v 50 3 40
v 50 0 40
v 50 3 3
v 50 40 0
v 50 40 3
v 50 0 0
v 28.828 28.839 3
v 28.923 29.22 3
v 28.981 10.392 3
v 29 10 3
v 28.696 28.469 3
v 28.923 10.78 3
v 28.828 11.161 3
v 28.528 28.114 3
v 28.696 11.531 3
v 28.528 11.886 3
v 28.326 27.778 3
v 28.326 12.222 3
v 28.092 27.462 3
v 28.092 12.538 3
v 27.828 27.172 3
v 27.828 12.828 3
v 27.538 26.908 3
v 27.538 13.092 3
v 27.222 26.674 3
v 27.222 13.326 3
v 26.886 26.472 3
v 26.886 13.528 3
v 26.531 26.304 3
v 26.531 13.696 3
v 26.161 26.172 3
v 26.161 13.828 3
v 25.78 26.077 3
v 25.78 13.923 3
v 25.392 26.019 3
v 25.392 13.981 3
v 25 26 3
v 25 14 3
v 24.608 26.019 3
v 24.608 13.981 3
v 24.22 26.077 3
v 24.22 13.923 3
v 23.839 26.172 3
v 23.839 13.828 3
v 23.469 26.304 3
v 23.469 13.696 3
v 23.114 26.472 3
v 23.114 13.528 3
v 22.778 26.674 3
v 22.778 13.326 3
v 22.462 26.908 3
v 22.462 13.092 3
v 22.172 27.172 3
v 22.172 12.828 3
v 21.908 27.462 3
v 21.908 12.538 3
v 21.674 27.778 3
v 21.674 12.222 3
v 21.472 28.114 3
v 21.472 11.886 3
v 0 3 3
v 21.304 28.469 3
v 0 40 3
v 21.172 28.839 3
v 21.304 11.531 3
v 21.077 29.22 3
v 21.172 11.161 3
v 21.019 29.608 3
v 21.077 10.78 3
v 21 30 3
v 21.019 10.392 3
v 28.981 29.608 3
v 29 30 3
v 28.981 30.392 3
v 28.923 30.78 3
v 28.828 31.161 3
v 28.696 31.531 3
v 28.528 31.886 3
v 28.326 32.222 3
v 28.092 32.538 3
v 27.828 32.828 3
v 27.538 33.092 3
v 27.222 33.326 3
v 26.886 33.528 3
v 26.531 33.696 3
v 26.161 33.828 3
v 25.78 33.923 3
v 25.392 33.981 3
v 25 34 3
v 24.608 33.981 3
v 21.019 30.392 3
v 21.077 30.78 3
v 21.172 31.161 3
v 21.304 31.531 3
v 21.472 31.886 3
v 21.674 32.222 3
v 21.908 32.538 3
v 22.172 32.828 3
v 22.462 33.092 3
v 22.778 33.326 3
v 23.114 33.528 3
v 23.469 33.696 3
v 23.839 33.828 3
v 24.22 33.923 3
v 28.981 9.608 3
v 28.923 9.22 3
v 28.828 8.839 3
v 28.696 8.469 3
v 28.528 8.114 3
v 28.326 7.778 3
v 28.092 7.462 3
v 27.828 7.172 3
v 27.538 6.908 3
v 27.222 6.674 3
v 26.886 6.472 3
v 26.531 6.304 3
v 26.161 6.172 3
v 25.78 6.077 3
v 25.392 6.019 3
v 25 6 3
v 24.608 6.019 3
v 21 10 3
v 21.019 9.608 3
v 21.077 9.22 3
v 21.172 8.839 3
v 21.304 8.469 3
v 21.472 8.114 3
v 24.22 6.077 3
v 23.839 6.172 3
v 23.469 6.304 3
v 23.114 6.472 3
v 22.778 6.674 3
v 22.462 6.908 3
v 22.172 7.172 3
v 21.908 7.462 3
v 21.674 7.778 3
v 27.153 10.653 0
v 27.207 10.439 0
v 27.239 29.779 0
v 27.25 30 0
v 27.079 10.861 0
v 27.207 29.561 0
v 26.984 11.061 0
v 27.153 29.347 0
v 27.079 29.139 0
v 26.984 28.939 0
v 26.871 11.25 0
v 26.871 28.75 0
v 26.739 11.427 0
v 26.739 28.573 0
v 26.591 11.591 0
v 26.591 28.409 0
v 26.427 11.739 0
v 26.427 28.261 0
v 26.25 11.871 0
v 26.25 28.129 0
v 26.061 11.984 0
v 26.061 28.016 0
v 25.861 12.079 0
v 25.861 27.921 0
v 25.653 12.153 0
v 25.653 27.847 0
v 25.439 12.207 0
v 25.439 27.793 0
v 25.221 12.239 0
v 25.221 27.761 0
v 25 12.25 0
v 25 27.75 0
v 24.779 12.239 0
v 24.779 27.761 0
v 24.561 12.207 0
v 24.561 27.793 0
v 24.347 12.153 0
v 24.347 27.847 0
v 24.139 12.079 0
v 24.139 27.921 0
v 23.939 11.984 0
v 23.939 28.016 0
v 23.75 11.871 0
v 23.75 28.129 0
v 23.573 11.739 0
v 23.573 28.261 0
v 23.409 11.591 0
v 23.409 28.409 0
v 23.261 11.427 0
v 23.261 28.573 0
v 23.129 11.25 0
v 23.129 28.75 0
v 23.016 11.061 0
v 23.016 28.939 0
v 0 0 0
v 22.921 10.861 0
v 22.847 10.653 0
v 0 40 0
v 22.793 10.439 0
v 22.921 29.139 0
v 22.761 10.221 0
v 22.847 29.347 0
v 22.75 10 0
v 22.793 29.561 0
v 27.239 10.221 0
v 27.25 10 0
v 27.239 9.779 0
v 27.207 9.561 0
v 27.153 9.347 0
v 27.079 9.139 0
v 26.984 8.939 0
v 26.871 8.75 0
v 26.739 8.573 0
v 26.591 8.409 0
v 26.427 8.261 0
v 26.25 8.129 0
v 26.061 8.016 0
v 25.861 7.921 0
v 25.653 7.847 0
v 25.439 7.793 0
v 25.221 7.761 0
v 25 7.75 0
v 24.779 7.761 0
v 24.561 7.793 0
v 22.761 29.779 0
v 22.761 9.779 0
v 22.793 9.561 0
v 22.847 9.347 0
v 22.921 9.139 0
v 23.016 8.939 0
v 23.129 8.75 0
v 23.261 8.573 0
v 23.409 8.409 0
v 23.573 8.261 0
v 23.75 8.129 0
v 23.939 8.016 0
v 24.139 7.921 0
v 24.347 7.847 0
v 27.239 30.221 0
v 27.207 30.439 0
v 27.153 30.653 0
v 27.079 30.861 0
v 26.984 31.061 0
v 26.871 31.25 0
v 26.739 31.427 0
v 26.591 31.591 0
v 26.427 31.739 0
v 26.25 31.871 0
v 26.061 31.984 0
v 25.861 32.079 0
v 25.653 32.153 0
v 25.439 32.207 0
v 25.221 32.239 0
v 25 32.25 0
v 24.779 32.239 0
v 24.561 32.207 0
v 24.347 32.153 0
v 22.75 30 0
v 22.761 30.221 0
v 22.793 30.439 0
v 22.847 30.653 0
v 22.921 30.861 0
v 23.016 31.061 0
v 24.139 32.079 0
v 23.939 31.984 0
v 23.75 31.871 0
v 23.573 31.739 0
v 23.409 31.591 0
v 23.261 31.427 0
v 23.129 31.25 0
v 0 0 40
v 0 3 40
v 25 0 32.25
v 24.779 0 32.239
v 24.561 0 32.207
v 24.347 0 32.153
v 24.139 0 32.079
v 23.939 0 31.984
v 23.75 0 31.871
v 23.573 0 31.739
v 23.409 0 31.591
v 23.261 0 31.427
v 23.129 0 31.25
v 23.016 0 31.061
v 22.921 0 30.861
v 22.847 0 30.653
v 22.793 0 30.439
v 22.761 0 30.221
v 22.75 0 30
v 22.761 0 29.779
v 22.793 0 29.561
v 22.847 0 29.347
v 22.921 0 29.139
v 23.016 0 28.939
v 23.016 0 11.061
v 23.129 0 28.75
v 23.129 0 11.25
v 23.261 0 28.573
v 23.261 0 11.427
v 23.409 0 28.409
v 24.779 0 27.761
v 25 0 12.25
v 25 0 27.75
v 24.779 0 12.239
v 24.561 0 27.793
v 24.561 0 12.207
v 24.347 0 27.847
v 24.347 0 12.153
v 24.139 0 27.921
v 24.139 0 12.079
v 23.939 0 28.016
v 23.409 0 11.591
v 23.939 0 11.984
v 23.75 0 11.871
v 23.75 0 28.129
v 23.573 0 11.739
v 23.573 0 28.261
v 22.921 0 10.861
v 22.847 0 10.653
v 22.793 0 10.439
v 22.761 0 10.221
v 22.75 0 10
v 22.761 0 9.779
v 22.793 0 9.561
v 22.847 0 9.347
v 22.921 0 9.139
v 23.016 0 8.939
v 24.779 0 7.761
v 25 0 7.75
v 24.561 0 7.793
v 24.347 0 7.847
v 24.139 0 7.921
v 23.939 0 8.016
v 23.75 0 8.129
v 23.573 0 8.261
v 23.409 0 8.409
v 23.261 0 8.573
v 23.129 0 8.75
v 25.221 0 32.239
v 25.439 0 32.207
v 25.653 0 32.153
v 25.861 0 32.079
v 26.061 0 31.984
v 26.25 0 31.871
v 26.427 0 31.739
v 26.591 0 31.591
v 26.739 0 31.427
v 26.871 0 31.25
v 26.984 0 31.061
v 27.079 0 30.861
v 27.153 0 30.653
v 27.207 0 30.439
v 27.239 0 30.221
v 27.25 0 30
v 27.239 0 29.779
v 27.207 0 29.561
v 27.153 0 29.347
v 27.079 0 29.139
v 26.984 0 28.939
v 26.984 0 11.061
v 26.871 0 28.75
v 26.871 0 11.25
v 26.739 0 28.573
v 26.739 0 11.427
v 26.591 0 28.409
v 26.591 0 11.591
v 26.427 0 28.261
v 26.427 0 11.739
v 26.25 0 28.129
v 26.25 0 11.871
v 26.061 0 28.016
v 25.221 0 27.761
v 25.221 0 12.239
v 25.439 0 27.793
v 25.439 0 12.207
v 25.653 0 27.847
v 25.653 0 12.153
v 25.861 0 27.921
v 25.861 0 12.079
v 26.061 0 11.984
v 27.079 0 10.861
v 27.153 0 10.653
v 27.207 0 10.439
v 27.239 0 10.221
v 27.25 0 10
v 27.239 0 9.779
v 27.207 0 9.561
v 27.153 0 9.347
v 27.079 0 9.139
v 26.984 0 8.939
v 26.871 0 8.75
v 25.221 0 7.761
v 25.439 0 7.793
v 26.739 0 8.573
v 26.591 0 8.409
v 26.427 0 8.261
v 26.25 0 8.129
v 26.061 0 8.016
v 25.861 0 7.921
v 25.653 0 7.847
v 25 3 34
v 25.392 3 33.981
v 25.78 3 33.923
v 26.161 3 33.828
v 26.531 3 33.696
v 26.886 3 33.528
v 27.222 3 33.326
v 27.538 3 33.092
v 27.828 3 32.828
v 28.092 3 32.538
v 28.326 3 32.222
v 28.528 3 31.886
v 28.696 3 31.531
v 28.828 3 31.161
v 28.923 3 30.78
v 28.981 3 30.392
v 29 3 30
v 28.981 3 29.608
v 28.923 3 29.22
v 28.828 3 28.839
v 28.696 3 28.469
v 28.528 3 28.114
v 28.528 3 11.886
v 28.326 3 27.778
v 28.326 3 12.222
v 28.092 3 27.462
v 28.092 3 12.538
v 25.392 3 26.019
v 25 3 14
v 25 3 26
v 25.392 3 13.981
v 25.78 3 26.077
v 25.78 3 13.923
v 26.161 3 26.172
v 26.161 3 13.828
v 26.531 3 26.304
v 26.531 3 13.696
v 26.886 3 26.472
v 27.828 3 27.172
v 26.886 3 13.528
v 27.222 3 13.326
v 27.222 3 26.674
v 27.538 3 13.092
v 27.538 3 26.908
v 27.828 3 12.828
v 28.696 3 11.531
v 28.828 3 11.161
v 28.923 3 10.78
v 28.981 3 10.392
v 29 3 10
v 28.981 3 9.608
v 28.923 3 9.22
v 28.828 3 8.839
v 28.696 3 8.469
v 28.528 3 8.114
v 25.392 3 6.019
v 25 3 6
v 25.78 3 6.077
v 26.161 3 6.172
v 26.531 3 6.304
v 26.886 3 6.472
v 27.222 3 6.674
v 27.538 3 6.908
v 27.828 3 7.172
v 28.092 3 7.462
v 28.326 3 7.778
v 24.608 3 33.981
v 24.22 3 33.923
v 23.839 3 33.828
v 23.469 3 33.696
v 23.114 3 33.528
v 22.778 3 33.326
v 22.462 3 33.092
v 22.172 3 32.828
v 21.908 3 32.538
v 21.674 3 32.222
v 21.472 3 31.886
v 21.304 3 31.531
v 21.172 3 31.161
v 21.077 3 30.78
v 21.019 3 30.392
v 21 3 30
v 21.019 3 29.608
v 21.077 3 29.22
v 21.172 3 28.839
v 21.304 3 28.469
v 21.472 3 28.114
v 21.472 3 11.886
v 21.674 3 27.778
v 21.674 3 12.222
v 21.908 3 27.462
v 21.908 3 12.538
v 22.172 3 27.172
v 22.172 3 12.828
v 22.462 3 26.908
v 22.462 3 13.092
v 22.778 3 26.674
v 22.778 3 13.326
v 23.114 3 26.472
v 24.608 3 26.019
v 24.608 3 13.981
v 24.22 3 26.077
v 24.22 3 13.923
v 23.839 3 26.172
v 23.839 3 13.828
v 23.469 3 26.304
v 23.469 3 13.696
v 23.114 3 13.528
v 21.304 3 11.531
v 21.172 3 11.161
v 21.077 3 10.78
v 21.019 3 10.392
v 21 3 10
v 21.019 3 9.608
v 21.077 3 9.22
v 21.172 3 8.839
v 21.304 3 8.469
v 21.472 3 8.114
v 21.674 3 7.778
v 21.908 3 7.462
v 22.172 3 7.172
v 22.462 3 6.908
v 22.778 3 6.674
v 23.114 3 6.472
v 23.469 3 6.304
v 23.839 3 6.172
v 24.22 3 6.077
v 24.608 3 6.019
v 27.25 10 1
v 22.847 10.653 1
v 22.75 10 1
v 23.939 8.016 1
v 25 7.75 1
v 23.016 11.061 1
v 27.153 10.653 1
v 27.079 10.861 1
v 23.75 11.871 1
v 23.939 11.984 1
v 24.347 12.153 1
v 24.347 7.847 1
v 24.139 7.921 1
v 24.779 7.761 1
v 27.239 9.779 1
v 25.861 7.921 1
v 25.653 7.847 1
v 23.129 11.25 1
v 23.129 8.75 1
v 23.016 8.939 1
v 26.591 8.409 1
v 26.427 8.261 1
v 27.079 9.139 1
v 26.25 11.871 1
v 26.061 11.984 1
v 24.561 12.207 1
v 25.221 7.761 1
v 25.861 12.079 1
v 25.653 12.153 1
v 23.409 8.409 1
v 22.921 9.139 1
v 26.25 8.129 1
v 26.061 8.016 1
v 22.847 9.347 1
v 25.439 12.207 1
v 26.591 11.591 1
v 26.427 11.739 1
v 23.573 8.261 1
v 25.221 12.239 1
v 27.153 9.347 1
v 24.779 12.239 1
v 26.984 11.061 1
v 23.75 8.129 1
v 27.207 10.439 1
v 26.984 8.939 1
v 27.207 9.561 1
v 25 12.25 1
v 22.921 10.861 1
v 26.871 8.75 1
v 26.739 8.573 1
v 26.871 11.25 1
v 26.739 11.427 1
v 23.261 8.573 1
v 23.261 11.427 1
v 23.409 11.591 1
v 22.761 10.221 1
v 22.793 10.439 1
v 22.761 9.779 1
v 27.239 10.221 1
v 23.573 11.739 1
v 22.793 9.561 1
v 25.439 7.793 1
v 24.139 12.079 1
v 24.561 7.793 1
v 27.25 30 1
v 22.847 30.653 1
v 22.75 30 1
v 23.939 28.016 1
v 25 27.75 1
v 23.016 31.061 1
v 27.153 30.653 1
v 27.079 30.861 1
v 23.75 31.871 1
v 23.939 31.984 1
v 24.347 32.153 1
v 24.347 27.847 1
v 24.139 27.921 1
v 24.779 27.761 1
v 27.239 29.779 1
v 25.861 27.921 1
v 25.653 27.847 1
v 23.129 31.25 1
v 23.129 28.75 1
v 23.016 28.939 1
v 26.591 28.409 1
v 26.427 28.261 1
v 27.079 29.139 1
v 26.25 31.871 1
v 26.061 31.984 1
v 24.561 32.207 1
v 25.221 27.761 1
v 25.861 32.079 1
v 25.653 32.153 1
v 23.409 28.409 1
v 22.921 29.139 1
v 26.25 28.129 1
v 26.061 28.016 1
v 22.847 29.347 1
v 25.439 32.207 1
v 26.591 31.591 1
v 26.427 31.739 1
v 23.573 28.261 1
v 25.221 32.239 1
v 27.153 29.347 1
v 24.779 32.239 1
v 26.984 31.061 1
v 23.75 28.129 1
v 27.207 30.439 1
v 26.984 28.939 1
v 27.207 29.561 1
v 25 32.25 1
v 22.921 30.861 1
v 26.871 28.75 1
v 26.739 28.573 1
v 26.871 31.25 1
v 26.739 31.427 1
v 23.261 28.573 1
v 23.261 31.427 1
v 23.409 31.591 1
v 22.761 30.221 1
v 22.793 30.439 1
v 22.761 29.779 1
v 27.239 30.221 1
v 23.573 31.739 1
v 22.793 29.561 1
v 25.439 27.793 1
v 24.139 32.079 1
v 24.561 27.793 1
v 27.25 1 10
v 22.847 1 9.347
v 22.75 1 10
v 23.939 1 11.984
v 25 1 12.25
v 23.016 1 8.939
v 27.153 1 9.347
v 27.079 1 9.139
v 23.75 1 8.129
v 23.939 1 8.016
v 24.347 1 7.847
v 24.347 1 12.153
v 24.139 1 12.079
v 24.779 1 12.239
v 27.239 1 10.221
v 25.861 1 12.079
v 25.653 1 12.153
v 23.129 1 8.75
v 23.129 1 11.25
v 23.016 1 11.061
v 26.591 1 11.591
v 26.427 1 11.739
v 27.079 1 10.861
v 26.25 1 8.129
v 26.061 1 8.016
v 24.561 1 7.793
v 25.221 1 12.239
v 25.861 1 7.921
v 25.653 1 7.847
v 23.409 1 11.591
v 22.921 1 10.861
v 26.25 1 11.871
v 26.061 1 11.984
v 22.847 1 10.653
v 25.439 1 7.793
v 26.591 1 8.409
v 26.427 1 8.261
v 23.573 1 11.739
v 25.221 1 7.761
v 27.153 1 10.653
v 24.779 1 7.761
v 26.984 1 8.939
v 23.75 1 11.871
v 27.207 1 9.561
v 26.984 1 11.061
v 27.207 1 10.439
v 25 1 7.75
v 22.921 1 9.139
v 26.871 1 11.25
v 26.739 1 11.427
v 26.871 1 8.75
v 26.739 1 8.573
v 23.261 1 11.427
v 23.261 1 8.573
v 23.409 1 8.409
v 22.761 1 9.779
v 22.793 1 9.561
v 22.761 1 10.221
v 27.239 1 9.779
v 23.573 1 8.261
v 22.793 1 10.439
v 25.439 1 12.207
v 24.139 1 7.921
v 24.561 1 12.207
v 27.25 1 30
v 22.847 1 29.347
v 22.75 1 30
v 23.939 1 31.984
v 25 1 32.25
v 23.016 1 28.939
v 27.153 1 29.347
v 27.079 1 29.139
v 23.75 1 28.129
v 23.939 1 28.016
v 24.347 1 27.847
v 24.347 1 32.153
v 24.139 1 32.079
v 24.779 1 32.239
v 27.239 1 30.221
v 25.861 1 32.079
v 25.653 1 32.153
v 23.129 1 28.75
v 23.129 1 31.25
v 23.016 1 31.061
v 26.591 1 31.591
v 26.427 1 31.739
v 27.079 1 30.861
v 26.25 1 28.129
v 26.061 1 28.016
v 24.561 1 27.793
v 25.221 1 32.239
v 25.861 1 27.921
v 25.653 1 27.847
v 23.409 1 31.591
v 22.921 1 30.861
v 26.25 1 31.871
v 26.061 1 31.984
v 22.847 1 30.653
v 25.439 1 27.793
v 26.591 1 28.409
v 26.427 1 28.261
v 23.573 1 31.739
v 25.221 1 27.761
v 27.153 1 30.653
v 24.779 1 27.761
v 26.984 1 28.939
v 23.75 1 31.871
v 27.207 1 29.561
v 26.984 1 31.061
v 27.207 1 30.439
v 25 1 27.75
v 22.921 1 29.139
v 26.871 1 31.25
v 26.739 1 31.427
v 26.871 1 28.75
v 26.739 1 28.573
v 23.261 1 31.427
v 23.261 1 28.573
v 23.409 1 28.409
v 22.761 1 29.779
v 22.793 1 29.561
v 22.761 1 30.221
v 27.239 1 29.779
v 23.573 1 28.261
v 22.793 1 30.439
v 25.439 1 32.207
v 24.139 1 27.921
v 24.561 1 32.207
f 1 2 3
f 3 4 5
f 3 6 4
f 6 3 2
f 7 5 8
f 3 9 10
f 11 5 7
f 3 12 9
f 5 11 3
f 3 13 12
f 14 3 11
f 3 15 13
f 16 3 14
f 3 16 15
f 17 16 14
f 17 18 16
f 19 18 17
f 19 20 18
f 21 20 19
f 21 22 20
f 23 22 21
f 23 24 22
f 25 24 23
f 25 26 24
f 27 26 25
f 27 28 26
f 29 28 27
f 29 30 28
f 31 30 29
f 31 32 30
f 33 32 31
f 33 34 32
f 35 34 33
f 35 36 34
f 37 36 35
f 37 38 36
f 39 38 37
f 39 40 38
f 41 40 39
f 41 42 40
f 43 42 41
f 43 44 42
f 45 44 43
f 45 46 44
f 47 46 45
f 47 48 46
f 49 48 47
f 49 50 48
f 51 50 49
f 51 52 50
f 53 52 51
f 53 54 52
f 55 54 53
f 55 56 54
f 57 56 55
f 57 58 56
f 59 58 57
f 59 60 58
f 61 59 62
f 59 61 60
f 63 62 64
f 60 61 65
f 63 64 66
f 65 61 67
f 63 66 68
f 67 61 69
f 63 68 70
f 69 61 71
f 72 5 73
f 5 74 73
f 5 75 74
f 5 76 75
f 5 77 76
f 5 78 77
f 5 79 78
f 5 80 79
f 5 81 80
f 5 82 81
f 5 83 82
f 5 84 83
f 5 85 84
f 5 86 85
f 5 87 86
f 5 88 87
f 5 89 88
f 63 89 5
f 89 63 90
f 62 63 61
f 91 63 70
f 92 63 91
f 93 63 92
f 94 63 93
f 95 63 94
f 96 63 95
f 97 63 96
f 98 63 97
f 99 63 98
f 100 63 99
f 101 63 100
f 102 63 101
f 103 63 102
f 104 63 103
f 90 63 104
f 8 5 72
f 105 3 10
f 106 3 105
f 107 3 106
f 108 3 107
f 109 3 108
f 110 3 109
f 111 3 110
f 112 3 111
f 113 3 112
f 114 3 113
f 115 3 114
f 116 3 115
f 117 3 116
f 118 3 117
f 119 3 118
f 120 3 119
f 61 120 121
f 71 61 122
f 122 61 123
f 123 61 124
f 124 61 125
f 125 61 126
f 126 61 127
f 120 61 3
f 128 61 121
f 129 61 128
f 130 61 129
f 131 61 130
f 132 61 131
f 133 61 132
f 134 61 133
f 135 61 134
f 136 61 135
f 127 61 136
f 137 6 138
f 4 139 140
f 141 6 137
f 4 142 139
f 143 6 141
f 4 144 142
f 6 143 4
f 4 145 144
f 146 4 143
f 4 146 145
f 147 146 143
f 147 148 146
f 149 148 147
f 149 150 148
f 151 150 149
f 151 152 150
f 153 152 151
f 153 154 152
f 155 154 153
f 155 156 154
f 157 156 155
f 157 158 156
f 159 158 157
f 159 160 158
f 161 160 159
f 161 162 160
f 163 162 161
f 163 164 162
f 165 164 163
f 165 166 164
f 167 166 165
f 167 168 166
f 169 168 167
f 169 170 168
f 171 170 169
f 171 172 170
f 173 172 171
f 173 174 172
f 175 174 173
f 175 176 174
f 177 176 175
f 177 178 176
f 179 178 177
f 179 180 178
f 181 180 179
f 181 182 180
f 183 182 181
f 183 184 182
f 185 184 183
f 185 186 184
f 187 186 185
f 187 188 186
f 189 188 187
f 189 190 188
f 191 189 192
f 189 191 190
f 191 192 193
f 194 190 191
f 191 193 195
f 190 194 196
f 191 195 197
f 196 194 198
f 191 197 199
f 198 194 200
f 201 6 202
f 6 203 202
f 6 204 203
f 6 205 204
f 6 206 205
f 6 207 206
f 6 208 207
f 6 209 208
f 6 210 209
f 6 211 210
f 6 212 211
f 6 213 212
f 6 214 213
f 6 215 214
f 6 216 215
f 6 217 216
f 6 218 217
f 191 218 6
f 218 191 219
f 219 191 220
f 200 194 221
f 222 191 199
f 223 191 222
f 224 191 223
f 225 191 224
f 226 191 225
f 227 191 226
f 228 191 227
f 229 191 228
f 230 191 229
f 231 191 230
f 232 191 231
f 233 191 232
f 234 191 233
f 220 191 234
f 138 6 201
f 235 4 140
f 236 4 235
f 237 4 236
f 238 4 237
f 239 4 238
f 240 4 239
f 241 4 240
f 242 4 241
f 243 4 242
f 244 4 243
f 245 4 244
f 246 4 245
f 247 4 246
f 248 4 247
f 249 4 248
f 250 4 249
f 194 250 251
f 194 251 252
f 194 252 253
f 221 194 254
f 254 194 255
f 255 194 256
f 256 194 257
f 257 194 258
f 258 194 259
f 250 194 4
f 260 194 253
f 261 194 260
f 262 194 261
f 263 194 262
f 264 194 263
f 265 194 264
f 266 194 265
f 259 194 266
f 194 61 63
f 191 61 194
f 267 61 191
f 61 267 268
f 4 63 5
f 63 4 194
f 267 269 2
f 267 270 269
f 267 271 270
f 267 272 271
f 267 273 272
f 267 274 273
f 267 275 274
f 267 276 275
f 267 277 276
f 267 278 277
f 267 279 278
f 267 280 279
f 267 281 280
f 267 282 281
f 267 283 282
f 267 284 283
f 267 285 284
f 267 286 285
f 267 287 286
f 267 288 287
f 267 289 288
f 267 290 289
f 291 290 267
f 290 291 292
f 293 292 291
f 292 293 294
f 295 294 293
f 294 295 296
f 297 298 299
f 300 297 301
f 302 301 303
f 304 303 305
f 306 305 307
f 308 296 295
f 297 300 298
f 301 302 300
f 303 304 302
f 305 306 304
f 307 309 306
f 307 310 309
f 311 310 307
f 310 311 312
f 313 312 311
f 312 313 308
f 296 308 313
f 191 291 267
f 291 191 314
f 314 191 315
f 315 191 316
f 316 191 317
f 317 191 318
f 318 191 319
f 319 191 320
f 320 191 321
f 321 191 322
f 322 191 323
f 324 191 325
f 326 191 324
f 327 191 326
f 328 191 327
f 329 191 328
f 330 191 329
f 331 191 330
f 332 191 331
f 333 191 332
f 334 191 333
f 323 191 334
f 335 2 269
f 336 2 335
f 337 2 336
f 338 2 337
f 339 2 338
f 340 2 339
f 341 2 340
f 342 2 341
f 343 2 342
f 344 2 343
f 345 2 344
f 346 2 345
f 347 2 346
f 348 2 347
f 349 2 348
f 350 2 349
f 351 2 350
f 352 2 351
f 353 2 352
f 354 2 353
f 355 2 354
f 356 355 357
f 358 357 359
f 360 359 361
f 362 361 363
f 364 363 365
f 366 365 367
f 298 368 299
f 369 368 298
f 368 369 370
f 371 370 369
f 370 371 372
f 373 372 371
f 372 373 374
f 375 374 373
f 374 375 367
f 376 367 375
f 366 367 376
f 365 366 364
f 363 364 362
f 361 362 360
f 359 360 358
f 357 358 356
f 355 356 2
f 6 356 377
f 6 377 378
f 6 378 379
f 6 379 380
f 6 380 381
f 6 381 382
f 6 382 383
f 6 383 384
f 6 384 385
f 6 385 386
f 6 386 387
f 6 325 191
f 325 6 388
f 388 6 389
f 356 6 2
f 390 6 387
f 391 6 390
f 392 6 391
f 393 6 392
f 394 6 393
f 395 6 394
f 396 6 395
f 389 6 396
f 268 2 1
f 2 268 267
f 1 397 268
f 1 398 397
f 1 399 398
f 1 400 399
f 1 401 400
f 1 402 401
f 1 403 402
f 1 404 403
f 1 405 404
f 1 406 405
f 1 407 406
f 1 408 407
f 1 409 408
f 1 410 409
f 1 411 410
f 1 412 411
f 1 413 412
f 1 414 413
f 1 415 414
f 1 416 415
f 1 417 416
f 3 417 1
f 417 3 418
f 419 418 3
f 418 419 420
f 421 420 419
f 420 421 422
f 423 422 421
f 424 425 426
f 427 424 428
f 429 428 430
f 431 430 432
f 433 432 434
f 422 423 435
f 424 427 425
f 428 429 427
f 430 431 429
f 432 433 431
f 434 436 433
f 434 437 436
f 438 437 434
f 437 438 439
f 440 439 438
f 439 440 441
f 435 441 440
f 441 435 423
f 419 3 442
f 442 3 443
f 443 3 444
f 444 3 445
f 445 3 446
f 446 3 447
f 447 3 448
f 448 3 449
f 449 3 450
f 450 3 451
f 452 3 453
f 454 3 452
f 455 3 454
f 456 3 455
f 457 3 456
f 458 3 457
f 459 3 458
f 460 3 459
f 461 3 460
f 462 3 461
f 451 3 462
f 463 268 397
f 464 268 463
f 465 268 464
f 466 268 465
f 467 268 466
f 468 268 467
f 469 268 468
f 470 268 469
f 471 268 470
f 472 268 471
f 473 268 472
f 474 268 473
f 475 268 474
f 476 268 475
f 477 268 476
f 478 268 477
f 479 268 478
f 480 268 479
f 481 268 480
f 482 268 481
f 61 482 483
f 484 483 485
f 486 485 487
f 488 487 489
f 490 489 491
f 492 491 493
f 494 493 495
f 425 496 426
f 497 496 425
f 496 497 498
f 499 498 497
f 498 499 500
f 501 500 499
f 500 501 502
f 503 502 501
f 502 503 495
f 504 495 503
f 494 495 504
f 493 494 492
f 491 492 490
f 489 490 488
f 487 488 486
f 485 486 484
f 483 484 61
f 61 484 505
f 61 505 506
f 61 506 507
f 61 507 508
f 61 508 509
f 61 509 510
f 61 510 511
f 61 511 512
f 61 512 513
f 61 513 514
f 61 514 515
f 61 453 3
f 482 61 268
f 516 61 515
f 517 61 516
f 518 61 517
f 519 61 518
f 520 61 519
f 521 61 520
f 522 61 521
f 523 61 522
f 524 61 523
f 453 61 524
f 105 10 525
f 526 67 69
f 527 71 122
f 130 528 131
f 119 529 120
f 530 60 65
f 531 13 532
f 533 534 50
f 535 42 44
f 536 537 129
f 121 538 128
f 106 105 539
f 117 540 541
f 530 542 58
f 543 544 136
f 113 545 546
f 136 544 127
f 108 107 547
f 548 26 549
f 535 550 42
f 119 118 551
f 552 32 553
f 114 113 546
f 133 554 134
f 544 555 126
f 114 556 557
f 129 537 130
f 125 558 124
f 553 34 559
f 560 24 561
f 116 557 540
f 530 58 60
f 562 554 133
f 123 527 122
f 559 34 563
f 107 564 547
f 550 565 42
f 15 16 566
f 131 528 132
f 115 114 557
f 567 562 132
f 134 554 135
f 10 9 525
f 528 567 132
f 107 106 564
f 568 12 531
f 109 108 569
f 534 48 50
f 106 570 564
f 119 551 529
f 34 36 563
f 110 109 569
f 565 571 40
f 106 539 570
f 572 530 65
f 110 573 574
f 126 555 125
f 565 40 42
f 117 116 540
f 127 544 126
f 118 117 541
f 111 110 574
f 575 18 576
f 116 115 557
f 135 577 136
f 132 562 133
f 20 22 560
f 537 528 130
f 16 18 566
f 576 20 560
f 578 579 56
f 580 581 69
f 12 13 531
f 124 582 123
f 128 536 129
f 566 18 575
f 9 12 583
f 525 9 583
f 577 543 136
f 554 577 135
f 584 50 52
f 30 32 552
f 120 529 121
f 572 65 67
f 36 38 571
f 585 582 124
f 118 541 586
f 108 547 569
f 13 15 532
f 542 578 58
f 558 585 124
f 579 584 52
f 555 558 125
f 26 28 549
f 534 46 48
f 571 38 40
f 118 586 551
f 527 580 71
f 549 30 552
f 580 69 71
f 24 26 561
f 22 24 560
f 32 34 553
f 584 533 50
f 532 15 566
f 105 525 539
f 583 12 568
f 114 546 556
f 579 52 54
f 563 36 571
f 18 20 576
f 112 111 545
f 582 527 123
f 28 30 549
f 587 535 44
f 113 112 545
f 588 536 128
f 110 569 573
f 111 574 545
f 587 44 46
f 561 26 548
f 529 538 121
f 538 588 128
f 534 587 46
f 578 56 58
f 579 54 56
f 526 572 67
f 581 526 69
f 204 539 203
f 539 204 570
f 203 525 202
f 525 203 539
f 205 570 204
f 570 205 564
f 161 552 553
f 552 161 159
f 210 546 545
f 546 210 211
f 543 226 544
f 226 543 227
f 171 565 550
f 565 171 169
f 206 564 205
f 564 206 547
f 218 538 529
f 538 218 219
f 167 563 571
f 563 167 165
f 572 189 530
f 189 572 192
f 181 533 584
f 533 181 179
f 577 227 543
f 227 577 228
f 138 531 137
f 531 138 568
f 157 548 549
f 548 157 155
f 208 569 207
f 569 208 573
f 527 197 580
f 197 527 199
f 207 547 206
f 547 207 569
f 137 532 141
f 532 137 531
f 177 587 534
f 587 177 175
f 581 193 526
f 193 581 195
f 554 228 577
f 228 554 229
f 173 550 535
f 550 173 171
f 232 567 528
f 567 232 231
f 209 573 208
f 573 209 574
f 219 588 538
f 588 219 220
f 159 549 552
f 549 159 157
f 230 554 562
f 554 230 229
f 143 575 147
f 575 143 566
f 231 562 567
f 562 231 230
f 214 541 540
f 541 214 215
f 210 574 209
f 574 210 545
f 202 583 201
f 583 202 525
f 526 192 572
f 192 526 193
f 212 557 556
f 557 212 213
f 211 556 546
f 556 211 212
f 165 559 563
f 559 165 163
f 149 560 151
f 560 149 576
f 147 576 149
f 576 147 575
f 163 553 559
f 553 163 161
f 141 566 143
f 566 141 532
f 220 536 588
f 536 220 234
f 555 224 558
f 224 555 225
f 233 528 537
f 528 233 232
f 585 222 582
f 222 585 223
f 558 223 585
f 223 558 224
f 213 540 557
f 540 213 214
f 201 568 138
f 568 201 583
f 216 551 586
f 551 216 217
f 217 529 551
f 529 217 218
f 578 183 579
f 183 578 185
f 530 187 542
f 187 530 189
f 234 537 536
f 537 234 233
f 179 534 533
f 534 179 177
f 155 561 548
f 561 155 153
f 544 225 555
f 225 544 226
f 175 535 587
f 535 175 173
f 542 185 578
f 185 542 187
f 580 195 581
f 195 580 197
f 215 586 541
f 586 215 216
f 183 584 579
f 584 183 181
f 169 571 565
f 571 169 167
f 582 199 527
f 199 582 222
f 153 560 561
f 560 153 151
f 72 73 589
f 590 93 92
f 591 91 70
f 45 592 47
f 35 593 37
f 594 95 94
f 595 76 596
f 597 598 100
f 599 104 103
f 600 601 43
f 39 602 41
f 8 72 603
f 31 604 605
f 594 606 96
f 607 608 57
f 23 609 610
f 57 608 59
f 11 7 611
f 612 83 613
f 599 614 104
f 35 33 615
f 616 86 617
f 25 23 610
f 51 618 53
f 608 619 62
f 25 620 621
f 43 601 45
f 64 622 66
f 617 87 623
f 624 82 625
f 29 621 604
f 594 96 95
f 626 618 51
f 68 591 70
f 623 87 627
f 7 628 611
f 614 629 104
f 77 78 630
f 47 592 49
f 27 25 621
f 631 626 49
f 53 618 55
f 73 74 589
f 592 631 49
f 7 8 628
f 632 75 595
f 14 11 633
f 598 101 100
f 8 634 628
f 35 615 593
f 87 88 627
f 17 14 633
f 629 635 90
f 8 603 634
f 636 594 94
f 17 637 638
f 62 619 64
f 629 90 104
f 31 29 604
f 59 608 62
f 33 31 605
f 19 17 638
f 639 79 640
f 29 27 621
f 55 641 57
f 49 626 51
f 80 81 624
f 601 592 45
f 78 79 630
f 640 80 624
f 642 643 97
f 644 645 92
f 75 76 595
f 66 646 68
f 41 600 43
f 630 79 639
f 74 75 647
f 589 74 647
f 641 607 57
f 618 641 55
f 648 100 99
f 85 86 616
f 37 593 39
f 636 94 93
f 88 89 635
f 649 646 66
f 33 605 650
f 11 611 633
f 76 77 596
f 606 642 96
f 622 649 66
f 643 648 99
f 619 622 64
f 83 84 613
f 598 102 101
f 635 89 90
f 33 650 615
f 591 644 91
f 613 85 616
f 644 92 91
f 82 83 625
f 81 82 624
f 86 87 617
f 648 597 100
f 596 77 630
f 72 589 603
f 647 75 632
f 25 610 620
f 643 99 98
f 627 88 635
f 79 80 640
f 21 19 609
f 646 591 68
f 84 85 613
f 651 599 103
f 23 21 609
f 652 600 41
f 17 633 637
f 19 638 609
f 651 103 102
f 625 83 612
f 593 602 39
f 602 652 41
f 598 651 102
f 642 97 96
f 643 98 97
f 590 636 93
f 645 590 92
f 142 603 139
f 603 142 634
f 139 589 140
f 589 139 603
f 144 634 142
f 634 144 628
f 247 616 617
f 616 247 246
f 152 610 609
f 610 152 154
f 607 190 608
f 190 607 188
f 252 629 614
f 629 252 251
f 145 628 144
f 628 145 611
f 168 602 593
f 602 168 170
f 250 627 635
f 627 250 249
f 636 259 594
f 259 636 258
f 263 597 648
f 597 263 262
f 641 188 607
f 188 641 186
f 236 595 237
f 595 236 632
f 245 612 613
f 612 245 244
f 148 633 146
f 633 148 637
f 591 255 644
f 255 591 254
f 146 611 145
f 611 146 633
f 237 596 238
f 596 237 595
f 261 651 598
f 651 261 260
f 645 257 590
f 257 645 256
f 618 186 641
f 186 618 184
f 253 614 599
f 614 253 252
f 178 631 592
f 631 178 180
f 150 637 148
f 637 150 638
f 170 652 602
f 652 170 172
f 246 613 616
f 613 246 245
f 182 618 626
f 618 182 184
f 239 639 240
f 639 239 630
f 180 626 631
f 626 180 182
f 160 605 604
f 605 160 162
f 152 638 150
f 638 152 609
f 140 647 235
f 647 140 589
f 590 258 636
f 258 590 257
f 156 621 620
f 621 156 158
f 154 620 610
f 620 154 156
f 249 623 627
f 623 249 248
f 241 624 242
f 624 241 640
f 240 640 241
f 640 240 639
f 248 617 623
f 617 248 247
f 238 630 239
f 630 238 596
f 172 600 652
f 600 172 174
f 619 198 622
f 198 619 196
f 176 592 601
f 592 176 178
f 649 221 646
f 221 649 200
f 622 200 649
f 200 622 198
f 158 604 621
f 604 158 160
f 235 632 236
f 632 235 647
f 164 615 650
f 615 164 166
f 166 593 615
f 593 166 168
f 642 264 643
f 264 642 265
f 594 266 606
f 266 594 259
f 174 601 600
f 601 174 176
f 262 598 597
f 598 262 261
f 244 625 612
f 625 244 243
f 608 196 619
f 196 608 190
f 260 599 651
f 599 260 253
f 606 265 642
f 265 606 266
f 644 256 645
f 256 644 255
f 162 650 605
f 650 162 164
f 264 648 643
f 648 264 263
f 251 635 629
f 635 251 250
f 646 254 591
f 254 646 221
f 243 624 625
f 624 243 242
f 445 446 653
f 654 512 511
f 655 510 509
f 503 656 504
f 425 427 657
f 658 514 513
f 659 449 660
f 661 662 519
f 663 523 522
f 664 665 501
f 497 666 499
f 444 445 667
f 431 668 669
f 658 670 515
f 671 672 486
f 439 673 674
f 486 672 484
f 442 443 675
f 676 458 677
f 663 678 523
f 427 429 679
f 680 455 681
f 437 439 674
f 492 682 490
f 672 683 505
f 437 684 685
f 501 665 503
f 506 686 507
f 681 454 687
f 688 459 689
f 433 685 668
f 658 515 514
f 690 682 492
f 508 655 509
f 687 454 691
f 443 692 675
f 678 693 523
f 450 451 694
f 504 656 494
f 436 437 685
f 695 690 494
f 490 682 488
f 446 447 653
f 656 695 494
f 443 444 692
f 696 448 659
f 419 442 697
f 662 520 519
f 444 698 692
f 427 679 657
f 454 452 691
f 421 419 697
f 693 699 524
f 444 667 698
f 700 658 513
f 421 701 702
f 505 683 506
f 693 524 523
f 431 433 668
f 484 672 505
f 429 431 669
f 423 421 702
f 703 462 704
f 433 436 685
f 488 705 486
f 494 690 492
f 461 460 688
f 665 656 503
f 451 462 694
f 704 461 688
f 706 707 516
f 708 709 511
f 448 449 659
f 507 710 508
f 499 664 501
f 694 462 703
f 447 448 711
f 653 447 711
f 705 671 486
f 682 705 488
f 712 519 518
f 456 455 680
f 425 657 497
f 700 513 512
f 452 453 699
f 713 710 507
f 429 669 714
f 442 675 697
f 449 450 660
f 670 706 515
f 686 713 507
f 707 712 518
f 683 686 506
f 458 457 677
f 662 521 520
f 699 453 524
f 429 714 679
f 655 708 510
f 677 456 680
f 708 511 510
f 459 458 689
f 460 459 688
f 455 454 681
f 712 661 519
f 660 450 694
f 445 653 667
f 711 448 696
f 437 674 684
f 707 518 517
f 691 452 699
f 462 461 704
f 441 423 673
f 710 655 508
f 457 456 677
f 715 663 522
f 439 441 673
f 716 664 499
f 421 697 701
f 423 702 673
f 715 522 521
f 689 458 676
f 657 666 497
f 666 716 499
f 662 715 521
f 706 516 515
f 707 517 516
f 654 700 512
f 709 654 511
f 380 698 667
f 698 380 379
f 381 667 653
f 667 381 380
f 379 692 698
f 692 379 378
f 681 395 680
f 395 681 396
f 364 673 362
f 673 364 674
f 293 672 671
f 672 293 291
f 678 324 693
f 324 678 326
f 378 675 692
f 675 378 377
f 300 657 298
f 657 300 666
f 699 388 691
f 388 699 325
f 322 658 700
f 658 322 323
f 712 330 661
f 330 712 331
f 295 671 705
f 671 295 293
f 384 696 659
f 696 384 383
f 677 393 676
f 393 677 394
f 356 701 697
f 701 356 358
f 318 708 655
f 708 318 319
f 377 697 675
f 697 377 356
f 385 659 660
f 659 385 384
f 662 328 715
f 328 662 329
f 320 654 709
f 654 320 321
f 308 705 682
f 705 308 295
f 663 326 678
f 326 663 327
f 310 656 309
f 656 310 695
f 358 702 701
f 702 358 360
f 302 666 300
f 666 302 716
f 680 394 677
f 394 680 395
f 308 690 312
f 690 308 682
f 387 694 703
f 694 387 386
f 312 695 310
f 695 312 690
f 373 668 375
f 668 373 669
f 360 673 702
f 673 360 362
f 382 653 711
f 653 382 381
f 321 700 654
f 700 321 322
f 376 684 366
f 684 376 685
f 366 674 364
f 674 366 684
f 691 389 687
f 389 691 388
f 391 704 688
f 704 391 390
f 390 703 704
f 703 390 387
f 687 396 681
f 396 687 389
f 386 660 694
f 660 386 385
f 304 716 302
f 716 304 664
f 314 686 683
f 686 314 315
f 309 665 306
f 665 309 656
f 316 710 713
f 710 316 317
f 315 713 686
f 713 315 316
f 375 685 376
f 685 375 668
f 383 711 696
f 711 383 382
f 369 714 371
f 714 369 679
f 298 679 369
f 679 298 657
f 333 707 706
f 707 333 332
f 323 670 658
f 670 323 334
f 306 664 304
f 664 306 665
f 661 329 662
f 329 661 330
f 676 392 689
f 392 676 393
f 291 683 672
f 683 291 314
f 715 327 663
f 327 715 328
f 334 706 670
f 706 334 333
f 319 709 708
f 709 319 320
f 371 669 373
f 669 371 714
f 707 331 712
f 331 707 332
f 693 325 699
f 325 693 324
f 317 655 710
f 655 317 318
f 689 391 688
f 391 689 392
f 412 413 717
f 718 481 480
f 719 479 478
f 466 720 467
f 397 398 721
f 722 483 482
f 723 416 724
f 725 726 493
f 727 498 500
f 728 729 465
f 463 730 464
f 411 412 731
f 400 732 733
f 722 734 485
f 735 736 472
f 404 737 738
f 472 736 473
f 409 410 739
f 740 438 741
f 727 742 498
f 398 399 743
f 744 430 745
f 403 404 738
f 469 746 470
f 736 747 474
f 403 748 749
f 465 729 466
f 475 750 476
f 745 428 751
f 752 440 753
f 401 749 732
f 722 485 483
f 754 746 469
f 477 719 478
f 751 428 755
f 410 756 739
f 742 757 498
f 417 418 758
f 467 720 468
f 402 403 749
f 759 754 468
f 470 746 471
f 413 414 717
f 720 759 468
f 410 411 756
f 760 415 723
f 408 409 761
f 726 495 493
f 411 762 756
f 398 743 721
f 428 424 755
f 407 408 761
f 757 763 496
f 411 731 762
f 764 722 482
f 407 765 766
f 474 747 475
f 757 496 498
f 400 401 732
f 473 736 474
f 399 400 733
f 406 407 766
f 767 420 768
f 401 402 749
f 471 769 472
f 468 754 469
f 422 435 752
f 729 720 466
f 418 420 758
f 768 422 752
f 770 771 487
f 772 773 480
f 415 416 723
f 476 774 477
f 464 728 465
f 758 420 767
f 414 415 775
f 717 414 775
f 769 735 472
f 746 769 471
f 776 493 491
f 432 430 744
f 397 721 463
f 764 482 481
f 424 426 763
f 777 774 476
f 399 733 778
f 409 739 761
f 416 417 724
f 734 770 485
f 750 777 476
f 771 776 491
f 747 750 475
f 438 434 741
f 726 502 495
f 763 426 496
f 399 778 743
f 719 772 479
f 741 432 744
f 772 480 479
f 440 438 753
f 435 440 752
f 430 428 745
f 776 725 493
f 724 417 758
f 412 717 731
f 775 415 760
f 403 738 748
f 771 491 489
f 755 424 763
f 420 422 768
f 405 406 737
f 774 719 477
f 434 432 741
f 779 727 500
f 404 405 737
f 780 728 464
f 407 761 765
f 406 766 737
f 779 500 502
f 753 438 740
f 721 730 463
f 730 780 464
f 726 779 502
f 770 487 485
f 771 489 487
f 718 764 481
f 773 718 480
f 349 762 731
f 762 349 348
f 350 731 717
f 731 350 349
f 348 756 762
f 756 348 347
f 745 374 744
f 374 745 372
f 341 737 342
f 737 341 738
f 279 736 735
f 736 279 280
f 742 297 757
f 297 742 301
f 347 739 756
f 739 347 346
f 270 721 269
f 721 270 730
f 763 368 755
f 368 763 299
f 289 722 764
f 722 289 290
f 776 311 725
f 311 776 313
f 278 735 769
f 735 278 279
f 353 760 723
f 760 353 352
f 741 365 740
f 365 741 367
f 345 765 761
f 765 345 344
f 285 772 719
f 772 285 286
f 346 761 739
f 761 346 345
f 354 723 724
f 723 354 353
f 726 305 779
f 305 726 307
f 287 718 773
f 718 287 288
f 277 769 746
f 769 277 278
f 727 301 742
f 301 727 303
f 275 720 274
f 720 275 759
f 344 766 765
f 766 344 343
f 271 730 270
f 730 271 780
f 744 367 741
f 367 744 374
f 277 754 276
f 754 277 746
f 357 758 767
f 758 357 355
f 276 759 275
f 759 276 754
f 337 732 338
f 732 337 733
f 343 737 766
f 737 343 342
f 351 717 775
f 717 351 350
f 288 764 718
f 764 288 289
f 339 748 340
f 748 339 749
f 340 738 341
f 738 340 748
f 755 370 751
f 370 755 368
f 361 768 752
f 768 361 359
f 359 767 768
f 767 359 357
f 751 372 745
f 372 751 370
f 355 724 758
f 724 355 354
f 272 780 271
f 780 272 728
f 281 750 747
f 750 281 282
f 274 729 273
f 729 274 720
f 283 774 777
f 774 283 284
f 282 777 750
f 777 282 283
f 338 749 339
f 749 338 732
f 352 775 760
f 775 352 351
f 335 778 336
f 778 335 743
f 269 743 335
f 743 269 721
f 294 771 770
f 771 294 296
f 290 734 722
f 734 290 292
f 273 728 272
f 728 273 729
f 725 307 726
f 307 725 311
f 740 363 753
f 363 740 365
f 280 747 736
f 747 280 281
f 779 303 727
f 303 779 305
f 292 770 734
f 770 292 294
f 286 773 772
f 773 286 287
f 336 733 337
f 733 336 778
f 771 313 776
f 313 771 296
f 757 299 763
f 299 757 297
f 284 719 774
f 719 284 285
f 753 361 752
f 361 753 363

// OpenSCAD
// L-bracket parameters
flange_width = 50;
flange_depth_horiz = 40;
flange_height_vert = 40;
plate_thickness = 3;

// Countersunk hole parameters (M4 screw)
// M4 specifies a major diameter of 4mm.
// A common clearance hole diameter is 4.5mm.
// A common countersunk head diameter is 8mm, with a depth of 2mm.
cs_hole_depth_cs = 2; // Depth of the conical countersunk part
cs_hole_radius_top = 8 / 2; // Radius at the top of the countersunk part
cs_hole_radius_bottom = 4.5 / 2; // Radius at the bottom of the countersunk part (same as through hole)
thru_hole_radius = 4.5 / 2; // Radius of the straight through hole

// Overall depth for the hole operation to ensure complete cut through the plate
hole_overall_depth = plate_thickness + 2; // plate_thickness (3mm) + extra (2mm) = 5mm

// Hole placement parameters
hole_margin = 10; // Distance from the edge to the center of the hole

// Module for a countersunk hole, defined to originate at [0,0,0] and extend along the +Z axis.
// The wide part of the countersink is at Z=0, and it extends upwards towards +Z.
// This allows easy rotation and translation to position the holes correctly for subtraction.
module countersunk_hole_m4() {
    union() {
        // Conical countersunk part (from Z=0 to Z=cs_hole_depth_cs)
        cylinder(h = cs_hole_depth_cs, r1 = cs_hole_radius_top, r2 = cs_hole_radius_bottom, $fn = 64);
        // Straight through hole part, starting from where the countersunk part ends
        translate([0, 0, cs_hole_depth_cs])
        cylinder(h = hole_overall_depth - cs_hole_depth_cs, r = thru_hole_radius, $fn = 64);
    }
}

difference() {
    // 1. Main L-bracket shape
    union() {
        // Horizontal flange:
        // Dimensions: [width, depth, thickness] = [50mm, 40mm, 3mm]
        // Placed with inner corner at [0,0,0].
        // Extends from X=0 to 50, Y=0 to 40, Z=0 to 3.
        // +Y direction is depth, +Z direction is upwards (thickness).
        cube([flange_width, flange_depth_horiz, plate_thickness]);

        // Vertical flange:
        // Dimensions: [width, thickness, height] = [50mm, 3mm, 40mm]
        // Placed with inner corner at [0,0,0].
        // Extends from X=0 to 50, Y=0 to 3, Z=0 to 40.
        // +Y direction is thickness (into the bracket), +Z direction is height.
        cube([flange_width, plate_thickness, flange_height_vert]);
    }

    // 2. Countersunk holes to subtract from the bracket
    // The countersunk_hole_m4 module creates a hole with its wide part at Z=0, extending along +Z.
    // We need to translate and rotate it to match the desired position and orientation
    // such that the countersink faces "outwards" from the bracket.

    // Horizontal flange holes:
    // Located on the top surface (Z = plate_thickness), facing outwards (towards +Z).
    // The inner corner is at [0,0,0], so the "outer" side of the horizontal flange is its top surface (Z=plate_thickness).
    // X-coordinate: Center of the flange (flange_width / 2).
    // Y-coordinates: hole_margin and (flange_depth_horiz - hole_margin).
    // Z-coordinate: Top surface of the flange (plate_thickness).
    // Rotation: [180, 0, 0] makes the hole point downwards (-Z), ensuring the countersink is on the top surface
    //           and recesses into the material from there.
    translate([flange_width / 2, hole_margin, plate_thickness])
    rotate([180, 0, 0]) // Rotate 180 deg around X-axis to point hole downwards
    countersunk_hole_m4();

    translate([flange_width / 2, flange_depth_horiz - hole_margin, plate_thickness])
    rotate([180, 0, 0]) // Rotate 180 deg around X-axis to point hole downwards
    countersunk_hole_m4();

    // Vertical flange holes:
    // Located on the front surface (Y = plate_thickness), facing outwards (towards +Y).
    // The inner corner is at [0,0,0], so the "outer" side of the vertical flange is its front surface (Y=plate_thickness).
    // X-coordinate: Center of the flange (flange_width / 2).
    // Y-coordinate: Front surface of the flange (plate_thickness).
    // Z-coordinates: hole_margin and (flange_height_vert - hole_margin).
    // Rotation: [90, 0, 0] makes the hole point towards +Y, ensuring the countersink is on the front surface
    //           and recesses into the material from there.
    translate([flange_width / 2, plate_thickness, hole_margin])
    rotate([90, 0, 0]) // Rotate 90 deg around X-axis to point hole towards +Y
    countersunk_hole_m4();

    translate([flange_width / 2, plate_thickness, flange_height_vert - hole_margin])
    rotate([90, 0, 0]) // Rotate 90 deg around X-axis to point hole towards +Y
    countersunk_hole_m4();
}
